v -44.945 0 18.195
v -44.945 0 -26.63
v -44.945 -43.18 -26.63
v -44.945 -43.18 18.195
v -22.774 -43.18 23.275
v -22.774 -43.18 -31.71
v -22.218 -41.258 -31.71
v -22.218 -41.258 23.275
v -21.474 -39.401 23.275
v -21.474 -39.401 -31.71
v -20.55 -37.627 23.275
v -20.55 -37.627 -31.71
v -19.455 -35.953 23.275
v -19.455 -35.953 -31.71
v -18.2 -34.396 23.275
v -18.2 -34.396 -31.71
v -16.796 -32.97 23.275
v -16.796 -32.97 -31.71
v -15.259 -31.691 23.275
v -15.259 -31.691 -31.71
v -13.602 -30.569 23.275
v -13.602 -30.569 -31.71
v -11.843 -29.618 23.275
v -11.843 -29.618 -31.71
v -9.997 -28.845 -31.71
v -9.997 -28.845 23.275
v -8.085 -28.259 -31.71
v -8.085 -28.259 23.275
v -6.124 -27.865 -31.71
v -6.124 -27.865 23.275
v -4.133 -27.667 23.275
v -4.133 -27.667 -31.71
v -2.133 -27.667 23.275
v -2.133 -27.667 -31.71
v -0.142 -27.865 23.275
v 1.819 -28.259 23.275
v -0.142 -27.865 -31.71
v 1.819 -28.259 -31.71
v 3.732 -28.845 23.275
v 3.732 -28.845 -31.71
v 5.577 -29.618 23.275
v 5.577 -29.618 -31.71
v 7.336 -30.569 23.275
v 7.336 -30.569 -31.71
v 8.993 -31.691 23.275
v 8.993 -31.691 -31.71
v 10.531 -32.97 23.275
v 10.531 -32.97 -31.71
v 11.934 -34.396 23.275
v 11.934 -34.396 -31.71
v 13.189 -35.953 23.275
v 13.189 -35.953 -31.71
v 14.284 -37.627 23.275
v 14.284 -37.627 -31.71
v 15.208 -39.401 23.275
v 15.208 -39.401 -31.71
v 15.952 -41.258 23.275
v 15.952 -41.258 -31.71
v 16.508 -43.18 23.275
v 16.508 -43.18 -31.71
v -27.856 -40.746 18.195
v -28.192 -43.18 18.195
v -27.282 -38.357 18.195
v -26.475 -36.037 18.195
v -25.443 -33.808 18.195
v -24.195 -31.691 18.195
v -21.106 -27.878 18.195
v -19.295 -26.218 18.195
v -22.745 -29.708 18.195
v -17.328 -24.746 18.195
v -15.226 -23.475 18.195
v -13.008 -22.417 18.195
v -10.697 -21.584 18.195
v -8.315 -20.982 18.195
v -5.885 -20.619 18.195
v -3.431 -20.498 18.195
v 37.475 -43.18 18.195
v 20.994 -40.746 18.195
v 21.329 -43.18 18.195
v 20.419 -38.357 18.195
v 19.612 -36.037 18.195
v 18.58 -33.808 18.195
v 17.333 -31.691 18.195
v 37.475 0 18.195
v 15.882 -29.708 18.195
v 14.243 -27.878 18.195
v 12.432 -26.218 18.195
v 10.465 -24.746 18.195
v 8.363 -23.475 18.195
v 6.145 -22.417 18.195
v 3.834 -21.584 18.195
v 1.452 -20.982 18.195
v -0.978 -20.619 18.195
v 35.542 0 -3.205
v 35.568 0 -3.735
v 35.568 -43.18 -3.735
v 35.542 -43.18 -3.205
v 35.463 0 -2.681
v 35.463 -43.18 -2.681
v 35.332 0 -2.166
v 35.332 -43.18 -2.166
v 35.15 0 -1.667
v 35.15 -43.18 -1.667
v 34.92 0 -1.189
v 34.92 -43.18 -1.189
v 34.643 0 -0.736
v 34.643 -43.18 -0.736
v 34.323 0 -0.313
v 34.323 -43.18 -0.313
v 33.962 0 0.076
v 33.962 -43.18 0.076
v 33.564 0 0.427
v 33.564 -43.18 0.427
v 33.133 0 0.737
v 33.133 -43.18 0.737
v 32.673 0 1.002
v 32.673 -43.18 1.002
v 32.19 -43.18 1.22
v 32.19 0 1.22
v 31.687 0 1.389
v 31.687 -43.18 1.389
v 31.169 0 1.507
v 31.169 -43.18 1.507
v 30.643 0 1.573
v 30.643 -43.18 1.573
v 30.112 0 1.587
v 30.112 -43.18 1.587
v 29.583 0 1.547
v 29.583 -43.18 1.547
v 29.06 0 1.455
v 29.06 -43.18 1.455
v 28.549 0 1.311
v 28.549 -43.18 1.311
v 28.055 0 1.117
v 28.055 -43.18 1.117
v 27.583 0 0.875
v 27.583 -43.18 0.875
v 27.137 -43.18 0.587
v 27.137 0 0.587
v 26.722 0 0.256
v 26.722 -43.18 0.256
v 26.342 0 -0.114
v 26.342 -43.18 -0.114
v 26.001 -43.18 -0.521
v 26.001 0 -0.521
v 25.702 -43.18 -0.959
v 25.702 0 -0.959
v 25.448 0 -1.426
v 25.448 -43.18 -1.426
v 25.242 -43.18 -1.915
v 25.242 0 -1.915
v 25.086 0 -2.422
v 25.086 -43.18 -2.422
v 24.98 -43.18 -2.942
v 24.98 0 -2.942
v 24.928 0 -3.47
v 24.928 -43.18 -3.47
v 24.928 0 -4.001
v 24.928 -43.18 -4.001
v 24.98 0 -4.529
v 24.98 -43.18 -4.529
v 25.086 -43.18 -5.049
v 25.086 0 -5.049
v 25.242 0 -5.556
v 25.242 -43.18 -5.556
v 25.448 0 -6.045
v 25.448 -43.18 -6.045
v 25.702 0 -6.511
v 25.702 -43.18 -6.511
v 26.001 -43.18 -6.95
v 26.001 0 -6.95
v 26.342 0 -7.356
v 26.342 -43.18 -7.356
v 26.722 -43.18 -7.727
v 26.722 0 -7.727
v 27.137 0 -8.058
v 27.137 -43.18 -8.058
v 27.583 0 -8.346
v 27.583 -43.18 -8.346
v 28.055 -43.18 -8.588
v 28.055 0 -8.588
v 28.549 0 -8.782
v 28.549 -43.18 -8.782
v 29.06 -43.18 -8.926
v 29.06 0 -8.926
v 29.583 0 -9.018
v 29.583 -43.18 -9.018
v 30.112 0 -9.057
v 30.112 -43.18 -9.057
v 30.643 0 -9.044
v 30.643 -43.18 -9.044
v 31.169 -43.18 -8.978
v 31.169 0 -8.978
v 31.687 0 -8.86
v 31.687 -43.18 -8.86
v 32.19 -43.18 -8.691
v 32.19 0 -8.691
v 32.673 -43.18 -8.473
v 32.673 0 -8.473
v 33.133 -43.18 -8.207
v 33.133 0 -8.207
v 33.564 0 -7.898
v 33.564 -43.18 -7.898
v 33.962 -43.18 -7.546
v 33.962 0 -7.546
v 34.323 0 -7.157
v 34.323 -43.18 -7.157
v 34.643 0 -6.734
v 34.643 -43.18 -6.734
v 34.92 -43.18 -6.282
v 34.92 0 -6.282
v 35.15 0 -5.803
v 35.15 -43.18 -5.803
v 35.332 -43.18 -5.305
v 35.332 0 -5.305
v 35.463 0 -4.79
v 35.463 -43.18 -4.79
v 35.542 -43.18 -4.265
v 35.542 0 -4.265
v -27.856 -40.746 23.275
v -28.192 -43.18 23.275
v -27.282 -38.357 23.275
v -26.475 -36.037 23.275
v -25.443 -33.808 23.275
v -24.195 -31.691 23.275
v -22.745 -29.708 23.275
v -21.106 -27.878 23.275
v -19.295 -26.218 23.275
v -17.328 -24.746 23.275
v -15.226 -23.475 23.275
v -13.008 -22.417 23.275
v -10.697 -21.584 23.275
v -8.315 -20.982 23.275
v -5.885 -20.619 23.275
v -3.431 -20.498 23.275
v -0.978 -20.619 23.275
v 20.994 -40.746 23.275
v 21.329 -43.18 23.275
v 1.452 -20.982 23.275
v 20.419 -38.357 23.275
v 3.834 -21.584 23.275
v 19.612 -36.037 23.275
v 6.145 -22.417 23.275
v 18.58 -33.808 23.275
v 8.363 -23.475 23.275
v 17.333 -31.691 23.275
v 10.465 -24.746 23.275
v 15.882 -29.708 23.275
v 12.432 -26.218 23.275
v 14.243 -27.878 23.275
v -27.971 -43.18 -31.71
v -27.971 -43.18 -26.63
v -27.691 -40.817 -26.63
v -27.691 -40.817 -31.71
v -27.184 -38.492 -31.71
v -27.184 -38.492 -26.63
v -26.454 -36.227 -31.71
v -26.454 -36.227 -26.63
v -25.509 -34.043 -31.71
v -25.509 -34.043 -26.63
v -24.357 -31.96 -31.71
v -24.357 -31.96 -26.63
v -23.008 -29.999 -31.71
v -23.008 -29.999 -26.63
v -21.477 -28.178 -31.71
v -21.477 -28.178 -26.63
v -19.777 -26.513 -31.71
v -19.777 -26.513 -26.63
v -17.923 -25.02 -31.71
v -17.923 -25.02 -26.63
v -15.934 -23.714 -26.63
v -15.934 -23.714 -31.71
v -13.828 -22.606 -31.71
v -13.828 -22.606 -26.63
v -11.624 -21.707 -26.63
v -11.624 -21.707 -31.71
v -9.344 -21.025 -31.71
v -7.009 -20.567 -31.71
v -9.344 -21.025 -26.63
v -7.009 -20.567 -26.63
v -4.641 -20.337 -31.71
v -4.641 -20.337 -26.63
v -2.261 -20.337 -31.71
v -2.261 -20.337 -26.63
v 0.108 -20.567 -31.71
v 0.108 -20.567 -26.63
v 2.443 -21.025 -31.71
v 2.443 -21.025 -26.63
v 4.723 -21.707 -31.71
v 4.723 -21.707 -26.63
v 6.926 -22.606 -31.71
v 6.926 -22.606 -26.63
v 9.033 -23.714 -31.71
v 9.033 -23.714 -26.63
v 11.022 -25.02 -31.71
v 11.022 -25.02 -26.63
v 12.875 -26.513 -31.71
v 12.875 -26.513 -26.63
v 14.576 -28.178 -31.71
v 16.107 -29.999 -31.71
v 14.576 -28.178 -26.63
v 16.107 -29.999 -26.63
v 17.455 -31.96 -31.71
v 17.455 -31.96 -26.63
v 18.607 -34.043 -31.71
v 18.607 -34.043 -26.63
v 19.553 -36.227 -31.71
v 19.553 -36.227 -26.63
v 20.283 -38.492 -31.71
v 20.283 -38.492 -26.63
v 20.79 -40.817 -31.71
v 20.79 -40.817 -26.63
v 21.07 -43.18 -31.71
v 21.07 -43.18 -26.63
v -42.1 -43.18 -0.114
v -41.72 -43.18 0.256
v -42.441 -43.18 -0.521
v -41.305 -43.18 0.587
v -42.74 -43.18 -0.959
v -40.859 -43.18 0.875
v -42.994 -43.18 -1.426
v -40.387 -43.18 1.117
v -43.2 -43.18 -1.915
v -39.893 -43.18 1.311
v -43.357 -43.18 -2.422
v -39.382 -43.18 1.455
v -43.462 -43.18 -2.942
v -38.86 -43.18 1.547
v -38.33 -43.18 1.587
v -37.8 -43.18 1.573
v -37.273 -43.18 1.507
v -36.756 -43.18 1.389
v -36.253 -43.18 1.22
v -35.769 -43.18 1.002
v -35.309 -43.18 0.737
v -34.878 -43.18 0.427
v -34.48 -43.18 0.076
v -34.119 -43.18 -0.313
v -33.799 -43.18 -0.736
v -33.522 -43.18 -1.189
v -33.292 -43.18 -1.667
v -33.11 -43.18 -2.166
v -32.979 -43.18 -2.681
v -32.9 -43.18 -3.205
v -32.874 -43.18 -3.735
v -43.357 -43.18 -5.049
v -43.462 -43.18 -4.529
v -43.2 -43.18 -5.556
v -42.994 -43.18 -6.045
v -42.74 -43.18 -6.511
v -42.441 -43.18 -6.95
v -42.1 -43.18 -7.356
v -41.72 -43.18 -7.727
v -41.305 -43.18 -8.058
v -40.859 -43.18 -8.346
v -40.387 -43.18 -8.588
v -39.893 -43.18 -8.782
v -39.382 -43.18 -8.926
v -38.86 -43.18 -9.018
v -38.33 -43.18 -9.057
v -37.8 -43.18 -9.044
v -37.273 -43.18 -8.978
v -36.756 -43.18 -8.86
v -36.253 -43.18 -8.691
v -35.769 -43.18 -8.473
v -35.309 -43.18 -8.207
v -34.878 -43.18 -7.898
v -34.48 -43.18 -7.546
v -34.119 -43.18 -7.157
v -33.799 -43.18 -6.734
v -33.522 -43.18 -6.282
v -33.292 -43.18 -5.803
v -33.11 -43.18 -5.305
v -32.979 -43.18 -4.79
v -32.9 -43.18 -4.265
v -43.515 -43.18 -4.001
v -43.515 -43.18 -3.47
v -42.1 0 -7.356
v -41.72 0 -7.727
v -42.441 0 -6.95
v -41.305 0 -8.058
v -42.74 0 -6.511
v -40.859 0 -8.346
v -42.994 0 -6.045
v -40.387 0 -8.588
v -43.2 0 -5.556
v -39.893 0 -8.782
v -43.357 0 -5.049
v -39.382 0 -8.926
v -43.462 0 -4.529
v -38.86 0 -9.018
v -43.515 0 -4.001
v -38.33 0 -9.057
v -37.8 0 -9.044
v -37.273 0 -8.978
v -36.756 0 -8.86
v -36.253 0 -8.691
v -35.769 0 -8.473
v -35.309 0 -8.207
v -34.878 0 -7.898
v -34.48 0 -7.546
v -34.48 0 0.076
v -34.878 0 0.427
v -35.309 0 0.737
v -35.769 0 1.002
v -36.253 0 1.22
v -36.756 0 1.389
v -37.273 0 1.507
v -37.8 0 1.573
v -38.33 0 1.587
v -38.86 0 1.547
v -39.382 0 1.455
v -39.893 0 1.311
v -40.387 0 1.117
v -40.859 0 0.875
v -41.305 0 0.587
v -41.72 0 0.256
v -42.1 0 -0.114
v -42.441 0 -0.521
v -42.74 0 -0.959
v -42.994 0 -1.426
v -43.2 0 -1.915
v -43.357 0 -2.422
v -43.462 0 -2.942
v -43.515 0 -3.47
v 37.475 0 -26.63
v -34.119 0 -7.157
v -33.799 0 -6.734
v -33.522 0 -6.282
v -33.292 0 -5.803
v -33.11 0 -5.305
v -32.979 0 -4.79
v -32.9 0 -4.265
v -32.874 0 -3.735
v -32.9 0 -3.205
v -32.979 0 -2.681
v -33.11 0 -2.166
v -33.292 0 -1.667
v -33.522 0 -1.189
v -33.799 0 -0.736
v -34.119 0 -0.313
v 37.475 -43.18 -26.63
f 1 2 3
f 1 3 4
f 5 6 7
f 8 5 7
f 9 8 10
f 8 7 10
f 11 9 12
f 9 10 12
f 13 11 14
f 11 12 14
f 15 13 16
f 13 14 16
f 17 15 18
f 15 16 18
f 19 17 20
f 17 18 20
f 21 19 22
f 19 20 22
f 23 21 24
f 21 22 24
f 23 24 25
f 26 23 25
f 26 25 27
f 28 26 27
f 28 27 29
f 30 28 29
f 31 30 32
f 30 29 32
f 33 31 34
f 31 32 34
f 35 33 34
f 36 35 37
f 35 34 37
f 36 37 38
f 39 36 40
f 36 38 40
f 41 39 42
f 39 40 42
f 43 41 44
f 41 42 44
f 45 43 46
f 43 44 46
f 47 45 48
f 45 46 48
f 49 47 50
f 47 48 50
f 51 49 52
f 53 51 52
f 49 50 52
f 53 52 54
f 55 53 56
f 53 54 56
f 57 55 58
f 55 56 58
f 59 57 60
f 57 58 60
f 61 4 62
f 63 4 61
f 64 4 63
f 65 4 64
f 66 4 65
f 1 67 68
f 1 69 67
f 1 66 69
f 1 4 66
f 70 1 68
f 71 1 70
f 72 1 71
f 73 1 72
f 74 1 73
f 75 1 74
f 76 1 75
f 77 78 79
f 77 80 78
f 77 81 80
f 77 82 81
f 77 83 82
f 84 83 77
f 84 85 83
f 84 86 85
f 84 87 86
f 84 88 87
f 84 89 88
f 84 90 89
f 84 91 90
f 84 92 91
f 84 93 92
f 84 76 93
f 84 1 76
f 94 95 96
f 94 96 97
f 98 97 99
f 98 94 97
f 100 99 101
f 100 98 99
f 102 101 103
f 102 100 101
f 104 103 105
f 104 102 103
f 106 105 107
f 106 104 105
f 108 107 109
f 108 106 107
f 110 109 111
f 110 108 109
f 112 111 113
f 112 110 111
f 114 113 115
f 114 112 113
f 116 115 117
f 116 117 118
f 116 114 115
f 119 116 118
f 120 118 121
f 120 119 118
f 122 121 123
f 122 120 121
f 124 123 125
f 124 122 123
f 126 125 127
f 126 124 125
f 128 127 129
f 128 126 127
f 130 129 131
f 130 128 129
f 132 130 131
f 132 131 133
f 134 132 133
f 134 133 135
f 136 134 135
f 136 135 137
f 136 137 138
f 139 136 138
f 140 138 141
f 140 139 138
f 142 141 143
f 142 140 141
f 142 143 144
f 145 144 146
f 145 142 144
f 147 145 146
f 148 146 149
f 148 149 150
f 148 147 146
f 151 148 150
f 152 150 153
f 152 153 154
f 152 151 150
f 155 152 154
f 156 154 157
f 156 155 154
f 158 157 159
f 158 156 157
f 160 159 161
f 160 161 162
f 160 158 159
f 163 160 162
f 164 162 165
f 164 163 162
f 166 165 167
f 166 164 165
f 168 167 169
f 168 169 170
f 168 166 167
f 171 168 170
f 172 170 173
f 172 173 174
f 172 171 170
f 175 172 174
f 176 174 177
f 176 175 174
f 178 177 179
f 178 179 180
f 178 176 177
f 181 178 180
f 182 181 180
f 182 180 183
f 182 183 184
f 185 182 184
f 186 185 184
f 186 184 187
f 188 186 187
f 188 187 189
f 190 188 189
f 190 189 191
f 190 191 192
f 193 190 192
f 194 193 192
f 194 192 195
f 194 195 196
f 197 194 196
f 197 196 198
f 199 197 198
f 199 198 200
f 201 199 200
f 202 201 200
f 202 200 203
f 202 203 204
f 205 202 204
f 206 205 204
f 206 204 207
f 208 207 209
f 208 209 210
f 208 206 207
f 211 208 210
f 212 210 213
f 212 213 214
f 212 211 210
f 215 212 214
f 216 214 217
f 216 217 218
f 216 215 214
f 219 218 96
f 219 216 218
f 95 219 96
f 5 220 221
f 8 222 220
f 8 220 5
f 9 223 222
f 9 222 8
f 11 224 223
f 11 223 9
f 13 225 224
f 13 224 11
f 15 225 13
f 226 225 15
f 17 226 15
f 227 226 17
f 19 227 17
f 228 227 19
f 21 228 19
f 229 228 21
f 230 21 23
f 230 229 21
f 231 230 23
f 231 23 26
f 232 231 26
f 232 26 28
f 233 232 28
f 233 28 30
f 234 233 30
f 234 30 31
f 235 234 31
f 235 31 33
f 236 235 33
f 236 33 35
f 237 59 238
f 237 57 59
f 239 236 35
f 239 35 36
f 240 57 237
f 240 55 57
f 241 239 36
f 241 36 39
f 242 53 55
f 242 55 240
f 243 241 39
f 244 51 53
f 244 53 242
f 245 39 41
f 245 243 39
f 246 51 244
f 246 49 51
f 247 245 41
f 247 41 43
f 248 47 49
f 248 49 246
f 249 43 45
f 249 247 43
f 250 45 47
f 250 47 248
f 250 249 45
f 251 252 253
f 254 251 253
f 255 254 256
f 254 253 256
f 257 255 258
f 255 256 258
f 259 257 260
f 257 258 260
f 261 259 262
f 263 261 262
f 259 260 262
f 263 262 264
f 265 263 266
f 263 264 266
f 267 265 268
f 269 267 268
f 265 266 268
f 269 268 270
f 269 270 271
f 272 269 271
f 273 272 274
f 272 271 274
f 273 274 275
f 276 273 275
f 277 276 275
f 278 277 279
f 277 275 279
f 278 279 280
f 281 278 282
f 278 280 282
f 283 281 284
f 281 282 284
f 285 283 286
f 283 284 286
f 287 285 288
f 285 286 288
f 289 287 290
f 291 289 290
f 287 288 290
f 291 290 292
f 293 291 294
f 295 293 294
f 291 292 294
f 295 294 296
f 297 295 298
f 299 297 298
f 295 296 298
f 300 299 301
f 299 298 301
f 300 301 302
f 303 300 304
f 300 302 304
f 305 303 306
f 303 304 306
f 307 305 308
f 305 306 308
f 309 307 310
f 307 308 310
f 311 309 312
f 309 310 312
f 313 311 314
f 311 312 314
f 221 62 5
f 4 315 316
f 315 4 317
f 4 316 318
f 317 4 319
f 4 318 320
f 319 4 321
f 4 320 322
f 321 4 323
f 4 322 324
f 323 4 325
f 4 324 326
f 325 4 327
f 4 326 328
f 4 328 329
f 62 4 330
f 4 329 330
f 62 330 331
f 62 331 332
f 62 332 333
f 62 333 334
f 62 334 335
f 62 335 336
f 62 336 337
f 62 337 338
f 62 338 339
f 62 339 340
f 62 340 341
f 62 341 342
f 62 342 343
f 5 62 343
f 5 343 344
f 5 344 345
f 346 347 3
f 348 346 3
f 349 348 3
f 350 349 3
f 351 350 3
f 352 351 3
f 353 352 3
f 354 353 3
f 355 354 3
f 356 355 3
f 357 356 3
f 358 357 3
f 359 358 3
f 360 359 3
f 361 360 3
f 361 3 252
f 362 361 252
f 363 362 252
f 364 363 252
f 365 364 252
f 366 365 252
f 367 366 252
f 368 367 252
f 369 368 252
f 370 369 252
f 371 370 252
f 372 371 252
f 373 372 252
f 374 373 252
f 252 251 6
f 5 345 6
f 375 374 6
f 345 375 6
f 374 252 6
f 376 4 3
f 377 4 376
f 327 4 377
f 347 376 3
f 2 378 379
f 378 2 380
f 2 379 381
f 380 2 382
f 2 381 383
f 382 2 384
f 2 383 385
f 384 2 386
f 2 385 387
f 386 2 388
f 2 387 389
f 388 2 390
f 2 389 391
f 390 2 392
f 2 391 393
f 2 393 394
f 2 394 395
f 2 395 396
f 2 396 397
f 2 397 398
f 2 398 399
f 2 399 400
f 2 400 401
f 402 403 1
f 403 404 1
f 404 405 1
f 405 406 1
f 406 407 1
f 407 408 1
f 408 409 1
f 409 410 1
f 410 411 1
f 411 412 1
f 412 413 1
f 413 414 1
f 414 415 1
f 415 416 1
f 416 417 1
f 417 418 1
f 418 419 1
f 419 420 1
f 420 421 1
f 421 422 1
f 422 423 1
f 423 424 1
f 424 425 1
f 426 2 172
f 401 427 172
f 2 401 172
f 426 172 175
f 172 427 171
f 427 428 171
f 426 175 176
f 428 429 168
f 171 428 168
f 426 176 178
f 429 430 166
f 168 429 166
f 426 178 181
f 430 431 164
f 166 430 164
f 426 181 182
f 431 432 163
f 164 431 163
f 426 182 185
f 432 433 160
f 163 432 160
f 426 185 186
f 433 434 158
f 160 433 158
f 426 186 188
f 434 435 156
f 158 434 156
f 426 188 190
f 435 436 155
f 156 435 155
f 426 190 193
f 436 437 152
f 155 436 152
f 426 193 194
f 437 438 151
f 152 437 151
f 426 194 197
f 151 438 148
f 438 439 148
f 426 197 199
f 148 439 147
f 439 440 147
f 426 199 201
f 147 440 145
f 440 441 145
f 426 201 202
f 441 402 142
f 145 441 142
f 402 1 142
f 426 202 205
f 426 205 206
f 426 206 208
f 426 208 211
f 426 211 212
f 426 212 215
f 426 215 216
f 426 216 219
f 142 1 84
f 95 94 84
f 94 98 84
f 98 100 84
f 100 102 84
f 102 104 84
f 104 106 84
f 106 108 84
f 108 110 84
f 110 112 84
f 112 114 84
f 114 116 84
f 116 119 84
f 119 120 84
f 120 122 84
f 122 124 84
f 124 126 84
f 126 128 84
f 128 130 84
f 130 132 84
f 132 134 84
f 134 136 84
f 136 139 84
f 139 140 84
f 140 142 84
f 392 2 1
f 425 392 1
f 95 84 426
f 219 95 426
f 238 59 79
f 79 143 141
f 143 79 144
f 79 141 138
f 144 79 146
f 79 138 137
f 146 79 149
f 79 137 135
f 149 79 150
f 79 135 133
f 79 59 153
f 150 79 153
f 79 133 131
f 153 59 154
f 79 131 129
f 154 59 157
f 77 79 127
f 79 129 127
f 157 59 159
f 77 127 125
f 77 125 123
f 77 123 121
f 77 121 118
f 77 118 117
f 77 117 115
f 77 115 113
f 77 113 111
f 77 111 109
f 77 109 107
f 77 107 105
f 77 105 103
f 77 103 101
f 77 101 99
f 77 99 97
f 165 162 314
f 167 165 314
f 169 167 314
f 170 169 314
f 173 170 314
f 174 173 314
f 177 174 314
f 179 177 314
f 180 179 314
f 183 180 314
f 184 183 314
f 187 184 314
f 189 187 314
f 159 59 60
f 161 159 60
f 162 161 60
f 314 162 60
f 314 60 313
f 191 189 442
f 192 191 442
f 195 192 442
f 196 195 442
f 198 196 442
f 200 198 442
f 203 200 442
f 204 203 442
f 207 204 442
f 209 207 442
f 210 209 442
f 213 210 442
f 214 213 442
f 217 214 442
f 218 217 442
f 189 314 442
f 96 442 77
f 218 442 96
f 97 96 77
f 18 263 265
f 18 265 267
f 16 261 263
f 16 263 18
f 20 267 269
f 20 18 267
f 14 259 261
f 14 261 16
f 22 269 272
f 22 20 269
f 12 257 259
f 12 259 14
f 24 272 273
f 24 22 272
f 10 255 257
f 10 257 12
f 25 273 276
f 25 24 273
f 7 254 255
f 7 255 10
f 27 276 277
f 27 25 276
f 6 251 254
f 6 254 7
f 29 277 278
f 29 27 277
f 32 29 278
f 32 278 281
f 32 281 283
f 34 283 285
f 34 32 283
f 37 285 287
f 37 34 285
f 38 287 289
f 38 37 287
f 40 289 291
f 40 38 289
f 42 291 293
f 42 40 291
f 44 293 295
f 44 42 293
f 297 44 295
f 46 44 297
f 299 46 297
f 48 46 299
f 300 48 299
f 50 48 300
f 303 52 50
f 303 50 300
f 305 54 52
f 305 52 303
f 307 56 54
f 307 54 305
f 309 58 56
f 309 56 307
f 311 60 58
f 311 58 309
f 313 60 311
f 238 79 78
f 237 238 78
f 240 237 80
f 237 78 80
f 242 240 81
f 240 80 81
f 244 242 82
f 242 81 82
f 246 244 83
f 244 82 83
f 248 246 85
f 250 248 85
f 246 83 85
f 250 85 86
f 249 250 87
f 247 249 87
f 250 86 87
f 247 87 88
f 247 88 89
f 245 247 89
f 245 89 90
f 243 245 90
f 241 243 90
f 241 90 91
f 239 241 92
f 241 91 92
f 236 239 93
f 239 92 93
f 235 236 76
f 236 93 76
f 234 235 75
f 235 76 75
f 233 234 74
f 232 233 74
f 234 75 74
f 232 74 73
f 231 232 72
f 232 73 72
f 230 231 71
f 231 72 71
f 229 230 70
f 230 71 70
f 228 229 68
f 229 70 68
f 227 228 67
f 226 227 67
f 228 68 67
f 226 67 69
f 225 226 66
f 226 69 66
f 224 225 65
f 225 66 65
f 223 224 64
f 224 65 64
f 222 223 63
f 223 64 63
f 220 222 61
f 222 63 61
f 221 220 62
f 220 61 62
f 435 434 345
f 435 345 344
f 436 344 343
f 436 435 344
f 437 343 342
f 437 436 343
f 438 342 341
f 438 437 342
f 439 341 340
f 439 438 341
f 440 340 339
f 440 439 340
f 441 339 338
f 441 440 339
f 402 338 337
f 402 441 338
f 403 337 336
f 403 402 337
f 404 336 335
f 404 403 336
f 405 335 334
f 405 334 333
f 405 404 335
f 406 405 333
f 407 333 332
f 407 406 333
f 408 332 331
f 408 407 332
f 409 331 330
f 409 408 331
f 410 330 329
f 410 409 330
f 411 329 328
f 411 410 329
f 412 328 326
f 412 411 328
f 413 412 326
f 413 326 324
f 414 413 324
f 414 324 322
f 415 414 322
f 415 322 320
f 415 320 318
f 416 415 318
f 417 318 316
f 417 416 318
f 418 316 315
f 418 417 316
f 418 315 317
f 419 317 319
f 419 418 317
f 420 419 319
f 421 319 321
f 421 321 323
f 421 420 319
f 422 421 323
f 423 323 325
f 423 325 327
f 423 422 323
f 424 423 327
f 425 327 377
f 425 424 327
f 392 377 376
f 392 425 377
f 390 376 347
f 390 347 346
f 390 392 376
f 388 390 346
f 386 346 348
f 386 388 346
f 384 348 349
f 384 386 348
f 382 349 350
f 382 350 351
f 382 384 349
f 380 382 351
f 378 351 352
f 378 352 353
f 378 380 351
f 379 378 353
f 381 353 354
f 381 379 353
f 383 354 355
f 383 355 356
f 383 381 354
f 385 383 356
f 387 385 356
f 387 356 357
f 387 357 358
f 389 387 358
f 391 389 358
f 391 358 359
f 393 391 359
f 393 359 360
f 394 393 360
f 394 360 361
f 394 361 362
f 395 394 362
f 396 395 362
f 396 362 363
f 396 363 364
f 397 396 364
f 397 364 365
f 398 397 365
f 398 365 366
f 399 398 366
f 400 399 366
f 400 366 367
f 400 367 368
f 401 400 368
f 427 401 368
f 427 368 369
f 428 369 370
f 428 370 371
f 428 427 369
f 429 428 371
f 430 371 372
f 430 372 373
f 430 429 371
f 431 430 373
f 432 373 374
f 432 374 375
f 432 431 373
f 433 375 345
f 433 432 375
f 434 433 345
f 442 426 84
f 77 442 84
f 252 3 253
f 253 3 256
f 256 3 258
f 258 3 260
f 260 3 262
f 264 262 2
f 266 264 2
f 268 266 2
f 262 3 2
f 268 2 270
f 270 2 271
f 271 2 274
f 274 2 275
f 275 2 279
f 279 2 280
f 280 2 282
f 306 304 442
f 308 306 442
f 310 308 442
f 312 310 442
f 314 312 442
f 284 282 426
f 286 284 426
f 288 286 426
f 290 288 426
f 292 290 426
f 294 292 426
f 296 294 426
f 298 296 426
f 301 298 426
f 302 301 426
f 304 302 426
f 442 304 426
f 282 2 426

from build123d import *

# Parameters (mm, degrees)
F0_W     = 82.4199393392
F0_H     = 44.8248814791
F0_R     = 5.3237338681
F1_DEPTH = 43.18
F3_DEPTH = 50.8
F5_DEPTH = 5.08
F7_DEPTH = 5.08


with BuildPart() as f1:
    # F0 (on Front) → F1 (new body)
    with BuildSketch(Plane.XZ):
        with Locations((-3.7354081869, -4.2173946276)):
            Rectangle(F0_W, F0_H)
        with Locations((-38.1975471973, -3.7354065571)):
            Circle(F0_R, mode=Mode.SUBTRACT)
        with Locations((30.2447415888, -3.7354065571)):
            Circle(F0_R, mode=Mode.SUBTRACT)
    extrude(amount=F1_DEPTH)

    # F2 (on face) → F3 (cut)
    with BuildSketch(Plane(origin=(0, 0, -26.6298353672), x_dir=(1, 0, 0), z_dir=(0, 0, -1))):
        with BuildLine():
            Line((16.5080875158, 43.18), (-22.7739289403, 43.18))
            ThreePointArc((-22.7739289403, 43.18), (-3.1329207122, 27.6417514992), (16.5080875158, 43.18))
        make_face()
    extrude(amount=-F3_DEPTH, mode=Mode.SUBTRACT)

    # F4 (on face) → F5 (join)
    with BuildSketch(Plane(origin=(0, 0, -26.6298353672), x_dir=(1, 0, 0), z_dir=(0, 0, -1))):
        with BuildLine():
            Line((-22.7739289403, 43.18), (-27.9714372009, 43.18))
            ThreePointArc((-27.9714372009, 43.18), (-3.4506693482, 20.3081134408), (21.0700985044, 43.18))
            Line((21.0700985044, 43.18), (16.5080875158, 43.18))
            ThreePointArc((16.5080875158, 43.18), (-3.1329207122, 27.6417514992), (-22.7739289403, 43.18))
        make_face()
    extrude(amount=F5_DEPTH)

    # F6 (on face) → F7 (join)
    with BuildSketch(Plane.XY.offset(18.1950461119)):
        with BuildLine():
            Line((16.5080875158, -43.18), (21.3290713727, -43.18))
            ThreePointArc((21.3290713727, -43.18), (-3.4313481301, -20.4979947498), (-28.191767633, -43.18))
            Line((-28.191767633, -43.18), (-22.7739289403, -43.18))
            ThreePointArc((-22.7739289403, -43.18), (-3.1329207122, -27.6417514992), (16.5080875158, -43.18))
        make_face()
    extrude(amount=F7_DEPTH)


solid = f1.part
